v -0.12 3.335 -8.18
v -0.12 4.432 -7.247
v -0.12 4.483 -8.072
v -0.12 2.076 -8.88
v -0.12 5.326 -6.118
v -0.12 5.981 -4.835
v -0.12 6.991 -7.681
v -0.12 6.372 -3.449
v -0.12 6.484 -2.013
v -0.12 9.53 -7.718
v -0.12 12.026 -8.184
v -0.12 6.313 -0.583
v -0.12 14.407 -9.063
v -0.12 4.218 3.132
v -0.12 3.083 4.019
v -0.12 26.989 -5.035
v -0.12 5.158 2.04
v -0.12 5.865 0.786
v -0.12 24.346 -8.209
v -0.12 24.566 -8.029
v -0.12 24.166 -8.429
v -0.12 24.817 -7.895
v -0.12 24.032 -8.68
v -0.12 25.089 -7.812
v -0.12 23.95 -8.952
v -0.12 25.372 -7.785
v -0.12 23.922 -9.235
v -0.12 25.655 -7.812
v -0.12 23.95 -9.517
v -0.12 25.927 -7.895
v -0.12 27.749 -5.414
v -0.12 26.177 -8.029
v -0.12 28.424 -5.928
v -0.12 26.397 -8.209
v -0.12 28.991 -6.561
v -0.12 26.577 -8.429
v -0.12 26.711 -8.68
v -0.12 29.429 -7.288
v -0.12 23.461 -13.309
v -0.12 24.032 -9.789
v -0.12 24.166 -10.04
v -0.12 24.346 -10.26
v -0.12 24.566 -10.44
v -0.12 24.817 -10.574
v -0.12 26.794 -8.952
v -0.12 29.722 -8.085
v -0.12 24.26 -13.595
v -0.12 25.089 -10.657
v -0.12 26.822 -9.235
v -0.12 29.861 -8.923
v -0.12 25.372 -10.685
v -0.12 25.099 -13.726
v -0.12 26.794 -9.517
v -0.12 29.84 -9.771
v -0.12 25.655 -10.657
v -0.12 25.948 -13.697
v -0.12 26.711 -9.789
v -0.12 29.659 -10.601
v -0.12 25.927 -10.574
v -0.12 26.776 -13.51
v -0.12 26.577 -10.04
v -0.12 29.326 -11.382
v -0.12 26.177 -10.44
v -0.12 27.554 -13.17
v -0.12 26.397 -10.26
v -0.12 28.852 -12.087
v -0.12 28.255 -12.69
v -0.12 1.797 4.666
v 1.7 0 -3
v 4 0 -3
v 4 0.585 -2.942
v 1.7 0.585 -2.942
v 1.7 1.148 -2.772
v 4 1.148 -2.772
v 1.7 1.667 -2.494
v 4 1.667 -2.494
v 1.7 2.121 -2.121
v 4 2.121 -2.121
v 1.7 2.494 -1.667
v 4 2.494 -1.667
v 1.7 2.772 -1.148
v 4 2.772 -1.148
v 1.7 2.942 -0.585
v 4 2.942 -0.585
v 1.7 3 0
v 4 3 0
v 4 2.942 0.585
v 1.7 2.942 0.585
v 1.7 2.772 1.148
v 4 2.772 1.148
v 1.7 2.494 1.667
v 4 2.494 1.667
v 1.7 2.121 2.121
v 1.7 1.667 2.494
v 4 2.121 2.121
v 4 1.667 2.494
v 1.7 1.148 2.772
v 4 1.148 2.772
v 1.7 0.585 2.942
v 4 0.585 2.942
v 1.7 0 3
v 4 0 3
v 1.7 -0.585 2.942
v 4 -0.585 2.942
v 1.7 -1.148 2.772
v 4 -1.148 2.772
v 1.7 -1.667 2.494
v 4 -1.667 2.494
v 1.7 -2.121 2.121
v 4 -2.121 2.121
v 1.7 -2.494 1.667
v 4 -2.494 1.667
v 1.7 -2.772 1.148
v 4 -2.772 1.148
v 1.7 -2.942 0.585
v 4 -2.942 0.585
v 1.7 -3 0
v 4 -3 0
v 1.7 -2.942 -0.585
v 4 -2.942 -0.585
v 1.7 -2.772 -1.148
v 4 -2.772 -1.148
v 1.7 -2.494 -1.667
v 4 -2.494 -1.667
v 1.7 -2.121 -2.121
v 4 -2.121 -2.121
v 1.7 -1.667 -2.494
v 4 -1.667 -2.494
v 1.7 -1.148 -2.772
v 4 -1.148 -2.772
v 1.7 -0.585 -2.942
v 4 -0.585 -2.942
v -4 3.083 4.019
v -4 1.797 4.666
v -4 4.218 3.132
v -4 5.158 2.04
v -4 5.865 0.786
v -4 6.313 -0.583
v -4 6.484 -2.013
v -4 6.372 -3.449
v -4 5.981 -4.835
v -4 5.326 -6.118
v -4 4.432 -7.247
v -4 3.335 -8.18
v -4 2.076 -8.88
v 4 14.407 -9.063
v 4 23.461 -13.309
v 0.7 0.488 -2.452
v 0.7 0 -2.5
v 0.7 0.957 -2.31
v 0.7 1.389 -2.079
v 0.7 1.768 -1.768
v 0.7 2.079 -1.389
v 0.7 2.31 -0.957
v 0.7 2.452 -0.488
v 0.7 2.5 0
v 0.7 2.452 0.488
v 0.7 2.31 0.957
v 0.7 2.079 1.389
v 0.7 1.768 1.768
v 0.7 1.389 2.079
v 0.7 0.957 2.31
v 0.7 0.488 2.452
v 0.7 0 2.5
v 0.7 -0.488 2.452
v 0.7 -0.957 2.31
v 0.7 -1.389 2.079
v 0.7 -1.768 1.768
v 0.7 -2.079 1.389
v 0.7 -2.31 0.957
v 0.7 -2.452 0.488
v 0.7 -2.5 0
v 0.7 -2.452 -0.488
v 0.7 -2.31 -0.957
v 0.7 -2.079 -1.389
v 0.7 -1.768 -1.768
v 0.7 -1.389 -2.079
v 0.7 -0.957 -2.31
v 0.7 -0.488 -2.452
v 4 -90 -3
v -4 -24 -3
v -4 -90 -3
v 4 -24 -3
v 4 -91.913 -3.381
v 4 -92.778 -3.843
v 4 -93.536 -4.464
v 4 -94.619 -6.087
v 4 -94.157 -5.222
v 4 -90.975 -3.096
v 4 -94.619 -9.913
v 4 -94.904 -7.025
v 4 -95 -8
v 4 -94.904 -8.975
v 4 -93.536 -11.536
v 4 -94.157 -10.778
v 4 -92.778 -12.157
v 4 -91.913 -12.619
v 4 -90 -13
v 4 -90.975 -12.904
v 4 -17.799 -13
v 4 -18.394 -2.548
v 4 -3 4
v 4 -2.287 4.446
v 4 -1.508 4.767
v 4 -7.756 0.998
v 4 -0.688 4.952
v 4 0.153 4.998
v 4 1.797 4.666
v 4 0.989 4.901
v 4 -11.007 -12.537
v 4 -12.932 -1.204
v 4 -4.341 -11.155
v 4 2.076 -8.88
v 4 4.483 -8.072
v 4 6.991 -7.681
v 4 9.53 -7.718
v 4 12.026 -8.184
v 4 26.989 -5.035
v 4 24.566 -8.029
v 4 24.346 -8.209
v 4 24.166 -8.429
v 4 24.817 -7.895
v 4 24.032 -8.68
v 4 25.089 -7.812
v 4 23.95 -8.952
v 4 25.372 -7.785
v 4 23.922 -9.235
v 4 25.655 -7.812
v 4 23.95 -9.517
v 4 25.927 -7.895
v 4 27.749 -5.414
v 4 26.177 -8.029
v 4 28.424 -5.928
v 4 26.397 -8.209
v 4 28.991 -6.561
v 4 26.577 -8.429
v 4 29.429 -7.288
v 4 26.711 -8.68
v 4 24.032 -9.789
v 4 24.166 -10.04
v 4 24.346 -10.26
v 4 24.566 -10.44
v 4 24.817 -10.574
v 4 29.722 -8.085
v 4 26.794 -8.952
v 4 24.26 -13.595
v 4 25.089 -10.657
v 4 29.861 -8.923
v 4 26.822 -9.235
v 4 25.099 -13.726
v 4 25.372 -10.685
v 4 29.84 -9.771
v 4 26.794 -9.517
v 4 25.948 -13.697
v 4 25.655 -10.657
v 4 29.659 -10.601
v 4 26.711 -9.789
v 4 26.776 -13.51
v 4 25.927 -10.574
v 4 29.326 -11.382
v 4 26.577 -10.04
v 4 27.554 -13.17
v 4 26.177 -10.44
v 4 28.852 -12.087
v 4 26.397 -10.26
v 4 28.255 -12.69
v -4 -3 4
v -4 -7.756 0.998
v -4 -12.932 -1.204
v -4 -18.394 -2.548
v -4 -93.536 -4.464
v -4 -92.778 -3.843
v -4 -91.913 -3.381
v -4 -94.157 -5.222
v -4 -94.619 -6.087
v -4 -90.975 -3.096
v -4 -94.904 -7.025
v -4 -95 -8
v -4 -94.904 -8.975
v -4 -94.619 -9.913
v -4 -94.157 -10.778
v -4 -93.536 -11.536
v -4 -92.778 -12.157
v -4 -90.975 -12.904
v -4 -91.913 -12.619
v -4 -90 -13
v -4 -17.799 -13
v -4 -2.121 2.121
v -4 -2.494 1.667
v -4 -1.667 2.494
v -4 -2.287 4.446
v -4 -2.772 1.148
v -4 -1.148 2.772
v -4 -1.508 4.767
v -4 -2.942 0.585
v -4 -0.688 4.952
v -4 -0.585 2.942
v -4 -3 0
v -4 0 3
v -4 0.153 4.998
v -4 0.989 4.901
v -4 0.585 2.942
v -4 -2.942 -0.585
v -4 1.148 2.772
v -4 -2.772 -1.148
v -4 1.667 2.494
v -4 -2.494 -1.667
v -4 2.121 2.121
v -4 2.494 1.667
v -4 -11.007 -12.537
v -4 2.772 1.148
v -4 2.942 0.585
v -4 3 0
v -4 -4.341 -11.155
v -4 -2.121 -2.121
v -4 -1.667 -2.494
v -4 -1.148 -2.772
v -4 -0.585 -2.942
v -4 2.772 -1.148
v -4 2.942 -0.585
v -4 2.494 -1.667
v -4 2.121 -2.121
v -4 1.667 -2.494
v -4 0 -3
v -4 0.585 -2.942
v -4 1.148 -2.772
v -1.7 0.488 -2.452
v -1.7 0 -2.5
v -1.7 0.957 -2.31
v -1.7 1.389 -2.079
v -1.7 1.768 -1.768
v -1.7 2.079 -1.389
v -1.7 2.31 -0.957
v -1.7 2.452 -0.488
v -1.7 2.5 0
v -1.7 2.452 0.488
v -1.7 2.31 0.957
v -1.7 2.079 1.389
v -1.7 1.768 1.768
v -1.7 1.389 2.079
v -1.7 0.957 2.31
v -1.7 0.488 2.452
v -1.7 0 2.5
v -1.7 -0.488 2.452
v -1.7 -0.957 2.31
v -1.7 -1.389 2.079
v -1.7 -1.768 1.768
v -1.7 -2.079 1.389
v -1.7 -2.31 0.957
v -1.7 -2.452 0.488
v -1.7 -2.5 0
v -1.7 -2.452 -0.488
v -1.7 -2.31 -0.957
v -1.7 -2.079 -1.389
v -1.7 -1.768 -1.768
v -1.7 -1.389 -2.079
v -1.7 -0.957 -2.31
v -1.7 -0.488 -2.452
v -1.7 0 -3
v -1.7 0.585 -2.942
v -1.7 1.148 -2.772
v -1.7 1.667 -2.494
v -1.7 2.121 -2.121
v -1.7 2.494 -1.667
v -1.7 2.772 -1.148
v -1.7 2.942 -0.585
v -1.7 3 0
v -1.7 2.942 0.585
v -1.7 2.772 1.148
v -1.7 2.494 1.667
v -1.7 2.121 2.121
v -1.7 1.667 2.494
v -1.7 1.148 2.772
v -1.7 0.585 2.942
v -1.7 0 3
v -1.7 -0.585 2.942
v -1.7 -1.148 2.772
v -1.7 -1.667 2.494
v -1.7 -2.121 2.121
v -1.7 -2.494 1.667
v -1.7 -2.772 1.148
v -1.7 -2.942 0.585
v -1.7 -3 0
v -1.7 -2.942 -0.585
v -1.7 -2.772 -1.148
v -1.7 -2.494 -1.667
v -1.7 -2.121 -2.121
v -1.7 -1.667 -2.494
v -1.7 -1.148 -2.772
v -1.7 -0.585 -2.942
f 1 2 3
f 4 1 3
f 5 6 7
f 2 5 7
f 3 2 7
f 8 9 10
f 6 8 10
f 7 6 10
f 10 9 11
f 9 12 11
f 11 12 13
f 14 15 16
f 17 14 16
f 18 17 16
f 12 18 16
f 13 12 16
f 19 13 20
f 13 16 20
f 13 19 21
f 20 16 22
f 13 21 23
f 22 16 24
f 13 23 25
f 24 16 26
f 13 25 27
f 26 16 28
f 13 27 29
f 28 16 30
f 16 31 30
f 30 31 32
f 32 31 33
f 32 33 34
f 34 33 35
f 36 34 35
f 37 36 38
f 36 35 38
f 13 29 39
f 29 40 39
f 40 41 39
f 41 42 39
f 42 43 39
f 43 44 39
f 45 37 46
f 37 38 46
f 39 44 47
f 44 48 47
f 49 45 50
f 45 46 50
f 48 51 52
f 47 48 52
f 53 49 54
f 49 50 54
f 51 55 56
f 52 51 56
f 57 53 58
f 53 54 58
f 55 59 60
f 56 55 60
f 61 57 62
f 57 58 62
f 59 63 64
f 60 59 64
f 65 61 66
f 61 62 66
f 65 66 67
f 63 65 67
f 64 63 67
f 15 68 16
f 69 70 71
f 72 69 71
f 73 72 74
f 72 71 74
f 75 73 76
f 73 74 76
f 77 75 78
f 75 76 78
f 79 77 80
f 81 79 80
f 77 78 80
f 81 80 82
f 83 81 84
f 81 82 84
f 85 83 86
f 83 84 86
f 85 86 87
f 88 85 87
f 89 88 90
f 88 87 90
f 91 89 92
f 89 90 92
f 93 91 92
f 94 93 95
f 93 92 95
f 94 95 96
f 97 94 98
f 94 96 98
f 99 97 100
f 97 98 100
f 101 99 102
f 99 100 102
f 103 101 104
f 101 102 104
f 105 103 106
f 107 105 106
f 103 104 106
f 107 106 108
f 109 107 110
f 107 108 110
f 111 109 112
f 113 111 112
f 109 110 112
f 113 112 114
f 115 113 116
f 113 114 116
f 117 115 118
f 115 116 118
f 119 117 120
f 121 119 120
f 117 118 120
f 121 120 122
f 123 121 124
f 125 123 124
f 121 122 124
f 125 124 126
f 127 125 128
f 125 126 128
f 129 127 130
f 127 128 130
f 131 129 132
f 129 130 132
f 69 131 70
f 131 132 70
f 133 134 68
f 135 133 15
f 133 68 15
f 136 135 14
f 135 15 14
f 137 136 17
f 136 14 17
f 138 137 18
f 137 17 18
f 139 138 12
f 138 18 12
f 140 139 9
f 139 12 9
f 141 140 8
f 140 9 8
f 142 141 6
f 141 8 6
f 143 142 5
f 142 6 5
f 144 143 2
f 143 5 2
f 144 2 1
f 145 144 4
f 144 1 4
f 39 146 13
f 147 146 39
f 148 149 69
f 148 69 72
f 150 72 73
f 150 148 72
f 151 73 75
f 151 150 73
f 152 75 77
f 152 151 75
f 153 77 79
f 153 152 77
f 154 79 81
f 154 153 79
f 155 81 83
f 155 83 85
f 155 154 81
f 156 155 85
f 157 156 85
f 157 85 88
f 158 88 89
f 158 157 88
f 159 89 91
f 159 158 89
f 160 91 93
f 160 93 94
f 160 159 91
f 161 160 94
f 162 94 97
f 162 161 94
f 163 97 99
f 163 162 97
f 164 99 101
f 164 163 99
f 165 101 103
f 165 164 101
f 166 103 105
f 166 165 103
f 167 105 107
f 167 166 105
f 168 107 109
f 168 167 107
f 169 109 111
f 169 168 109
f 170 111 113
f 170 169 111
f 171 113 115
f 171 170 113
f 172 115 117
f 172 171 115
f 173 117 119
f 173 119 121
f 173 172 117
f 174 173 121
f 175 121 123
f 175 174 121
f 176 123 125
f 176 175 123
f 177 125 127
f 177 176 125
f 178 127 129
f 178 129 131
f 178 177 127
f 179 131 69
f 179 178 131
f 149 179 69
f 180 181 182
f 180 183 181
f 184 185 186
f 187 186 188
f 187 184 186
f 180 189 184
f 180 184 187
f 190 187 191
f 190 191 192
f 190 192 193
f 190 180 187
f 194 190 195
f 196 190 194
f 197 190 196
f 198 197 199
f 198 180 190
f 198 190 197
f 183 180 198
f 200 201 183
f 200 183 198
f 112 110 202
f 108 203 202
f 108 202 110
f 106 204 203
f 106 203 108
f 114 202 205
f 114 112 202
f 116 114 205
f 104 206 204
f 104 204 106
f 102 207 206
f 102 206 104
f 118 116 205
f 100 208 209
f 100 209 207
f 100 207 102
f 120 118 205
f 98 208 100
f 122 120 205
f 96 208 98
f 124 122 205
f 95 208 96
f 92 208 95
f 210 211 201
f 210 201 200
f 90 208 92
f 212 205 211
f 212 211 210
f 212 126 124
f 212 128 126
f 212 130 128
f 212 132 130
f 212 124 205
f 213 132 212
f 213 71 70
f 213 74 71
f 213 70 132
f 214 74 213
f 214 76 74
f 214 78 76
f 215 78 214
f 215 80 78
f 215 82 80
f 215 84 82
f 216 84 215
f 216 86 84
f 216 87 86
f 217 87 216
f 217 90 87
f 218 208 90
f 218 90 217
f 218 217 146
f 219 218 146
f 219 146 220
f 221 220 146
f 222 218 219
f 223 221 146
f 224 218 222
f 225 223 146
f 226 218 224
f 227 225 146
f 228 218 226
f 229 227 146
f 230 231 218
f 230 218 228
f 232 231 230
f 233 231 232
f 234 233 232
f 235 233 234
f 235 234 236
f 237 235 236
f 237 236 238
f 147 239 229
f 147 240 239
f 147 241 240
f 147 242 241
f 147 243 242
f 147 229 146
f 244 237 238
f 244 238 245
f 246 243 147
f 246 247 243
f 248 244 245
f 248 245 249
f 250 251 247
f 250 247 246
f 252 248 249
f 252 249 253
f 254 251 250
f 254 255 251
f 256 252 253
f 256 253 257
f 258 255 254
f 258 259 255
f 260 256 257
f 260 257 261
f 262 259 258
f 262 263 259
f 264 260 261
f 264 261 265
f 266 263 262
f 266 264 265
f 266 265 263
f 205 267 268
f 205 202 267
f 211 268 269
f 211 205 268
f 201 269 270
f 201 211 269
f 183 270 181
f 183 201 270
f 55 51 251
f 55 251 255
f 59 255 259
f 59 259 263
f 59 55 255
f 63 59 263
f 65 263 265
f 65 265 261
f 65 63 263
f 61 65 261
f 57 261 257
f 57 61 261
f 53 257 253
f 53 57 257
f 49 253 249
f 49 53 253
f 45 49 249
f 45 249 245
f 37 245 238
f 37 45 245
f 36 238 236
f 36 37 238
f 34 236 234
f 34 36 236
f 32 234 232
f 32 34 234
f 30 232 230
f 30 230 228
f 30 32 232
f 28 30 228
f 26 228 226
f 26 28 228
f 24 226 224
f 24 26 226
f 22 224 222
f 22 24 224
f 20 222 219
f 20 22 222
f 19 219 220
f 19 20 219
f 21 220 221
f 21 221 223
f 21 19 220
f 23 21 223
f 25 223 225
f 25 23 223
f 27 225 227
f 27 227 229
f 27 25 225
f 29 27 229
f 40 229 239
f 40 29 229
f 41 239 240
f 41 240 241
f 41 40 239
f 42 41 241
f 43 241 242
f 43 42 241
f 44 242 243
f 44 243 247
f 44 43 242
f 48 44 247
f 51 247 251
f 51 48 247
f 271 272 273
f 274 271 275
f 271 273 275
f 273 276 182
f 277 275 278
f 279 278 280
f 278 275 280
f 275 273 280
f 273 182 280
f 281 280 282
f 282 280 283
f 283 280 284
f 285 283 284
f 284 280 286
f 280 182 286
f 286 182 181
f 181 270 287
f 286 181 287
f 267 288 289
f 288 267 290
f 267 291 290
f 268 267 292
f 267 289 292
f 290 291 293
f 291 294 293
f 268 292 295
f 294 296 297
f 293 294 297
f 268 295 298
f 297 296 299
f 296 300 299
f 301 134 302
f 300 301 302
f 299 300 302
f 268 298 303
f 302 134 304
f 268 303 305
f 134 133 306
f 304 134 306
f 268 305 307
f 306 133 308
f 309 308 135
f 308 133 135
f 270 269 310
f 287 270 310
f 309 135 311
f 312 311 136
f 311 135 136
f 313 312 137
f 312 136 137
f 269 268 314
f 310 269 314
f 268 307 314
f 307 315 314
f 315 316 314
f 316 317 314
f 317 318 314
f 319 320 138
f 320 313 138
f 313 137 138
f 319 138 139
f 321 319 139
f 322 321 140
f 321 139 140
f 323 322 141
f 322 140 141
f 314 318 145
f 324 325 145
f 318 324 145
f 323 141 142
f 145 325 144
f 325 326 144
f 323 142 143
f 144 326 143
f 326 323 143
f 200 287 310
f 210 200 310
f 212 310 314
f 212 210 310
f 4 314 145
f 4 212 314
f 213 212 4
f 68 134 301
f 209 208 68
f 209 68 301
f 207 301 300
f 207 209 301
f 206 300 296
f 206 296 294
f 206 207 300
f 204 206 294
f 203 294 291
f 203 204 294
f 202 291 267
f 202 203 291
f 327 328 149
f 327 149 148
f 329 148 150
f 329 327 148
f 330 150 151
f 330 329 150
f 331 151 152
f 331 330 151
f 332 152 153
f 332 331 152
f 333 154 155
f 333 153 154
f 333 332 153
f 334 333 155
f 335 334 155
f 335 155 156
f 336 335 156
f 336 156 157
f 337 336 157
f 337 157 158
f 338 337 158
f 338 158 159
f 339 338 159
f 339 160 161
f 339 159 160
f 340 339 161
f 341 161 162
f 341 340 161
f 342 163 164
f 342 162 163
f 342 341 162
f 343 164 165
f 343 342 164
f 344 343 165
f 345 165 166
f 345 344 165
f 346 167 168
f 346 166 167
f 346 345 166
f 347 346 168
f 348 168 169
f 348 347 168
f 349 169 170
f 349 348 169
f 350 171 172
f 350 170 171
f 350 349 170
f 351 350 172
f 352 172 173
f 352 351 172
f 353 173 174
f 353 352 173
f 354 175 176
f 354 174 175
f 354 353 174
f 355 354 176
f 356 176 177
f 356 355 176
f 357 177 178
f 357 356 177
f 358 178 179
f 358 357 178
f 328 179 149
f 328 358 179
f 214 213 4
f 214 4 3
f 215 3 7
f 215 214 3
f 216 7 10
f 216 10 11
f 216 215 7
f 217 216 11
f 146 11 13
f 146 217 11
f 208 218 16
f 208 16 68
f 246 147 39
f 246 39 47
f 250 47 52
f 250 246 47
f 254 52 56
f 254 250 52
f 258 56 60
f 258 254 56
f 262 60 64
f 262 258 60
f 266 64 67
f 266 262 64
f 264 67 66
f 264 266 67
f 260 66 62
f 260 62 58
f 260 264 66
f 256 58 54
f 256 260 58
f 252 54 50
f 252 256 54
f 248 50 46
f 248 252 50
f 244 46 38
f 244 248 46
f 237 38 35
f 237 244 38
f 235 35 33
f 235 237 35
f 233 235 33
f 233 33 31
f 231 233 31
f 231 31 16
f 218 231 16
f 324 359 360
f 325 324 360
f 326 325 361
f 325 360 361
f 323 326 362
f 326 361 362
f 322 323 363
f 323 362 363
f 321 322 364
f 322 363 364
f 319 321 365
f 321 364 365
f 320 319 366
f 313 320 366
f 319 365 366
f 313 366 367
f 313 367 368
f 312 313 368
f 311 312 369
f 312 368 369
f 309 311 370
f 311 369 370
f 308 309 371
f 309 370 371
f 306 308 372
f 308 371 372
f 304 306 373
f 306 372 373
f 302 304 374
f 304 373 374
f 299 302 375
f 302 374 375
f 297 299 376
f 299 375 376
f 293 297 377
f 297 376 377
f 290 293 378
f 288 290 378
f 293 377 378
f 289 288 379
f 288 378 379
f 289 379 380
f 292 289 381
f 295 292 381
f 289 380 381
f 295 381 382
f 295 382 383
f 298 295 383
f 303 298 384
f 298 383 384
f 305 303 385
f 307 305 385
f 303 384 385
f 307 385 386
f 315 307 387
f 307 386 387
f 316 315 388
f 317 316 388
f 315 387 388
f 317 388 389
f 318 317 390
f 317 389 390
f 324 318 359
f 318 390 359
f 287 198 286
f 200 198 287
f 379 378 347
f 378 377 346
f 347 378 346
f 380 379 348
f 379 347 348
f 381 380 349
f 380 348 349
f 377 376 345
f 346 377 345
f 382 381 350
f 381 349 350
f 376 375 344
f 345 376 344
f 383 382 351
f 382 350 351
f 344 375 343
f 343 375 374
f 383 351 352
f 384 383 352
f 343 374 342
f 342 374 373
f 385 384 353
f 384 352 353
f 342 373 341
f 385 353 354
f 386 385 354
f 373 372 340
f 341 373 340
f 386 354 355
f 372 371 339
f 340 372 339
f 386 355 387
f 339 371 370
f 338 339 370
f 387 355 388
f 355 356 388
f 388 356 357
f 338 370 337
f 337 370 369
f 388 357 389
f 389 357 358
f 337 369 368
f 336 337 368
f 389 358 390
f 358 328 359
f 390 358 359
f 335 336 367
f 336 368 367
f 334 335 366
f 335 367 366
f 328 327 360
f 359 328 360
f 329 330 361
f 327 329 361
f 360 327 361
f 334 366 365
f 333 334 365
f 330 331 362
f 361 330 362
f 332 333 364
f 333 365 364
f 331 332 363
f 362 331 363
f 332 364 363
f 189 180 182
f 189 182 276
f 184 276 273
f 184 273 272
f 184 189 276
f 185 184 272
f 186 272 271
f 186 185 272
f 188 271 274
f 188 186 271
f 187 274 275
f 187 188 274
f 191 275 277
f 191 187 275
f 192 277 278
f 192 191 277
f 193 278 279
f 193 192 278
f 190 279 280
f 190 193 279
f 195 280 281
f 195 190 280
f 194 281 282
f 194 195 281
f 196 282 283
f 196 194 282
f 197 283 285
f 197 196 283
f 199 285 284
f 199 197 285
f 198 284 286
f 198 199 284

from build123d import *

# Parameters (mm, degrees)
SKETCH1_R           = 2.5
SKETCH1_R_2         = 1.45
BOSS_EXTRUDE1_DEPTH = 4
SKETCH2_R           = 3
CUT_EXTRUDE1_DEPTH  = 3.3
CUT_EXTRUDE2_START  = -0.12
SKETCH1_5_R         = 4.5
SKETCH1_5_R_2       = 1.45
CUT_EXTRUDE2_DEPTH  = 96.951003405
CUT_EXTRUDE3_START  = -5.7
SKETCH2_2_R         = 3
CUT_EXTRUDE3_DEPTH  = 2.3
CHAMFER1_SIZE2      = 0.5
CHAMFER1_SIZE       = 1


with BuildPart() as part:
    # Sketch1 → Boss-Extrude1 (new, symmetric)
    with BuildSketch(Plane(origin=(0, 0, 0), x_dir=(0, 0, -1), z_dir=(1, 0, 0))):
        with BuildLine():
            Line((3, -24), (3, -90))
            ThreePointArc((3, -90), (8, -95), (13, -90))
            Line((13, -90), (13, -17.799320055))
            ThreePointArc((13, -17.799320055), (11.959160872, -7.650400571), (8.879977332, 2.075983213))
            ThreePointArc((8.879977332, 2.075983213), (7.645623758, 8.261271435), (9.063072492, 14.407185379))
            Line((9.063072492, 14.407185379), (13.308813282, 23.461117406))
            ThreePointArc((13.308813282, 23.461117406), (10.999511856, 29.511131641), (5.035153889, 26.988835198))
            Line((5.035153889, 26.988835198), (-4.665988868, 1.79681604))
            ThreePointArc((-4.665988868, 1.79681604), (-4.952494502, -0.687603231), (-4, -3))
            ThreePointArc((-4, -3), (1.203915432, -12.932028189), (3, -24))
        make_face()
        Circle(SKETCH1_R, mode=Mode.SUBTRACT)
        with Locations((9.23454387, 25.371700761)):
            Circle(SKETCH1_R_2, mode=Mode.SUBTRACT)
    extrude(amount=BOSS_EXTRUDE1_DEPTH, both=True)

    # Sketch2 → Cut-Extrude1 (cut)
    with BuildSketch(Plane(origin=(4, 0, 0), x_dir=(0, 0, -1), z_dir=(1, 0, 0))):
        Circle(SKETCH2_R)
    extrude(amount=-CUT_EXTRUDE1_DEPTH, mode=Mode.SUBTRACT)

    # Sketch1<5> → Cut-Extrude2 (cut, through all)
    # profile 1 of 2: a face of its own
    with BuildSketch(Plane(origin=(0, 0, 0), x_dir=(0, 0, -1), z_dir=(1, 0, 0)).offset(CUT_EXTRUDE2_START)):
        with BuildLine():
            ThreePointArc((-4.665988868, 1.79681604), (2.013271717, 6.484076223), (8.879977332, 2.075983213))
            ThreePointArc((8.879977332, 2.075983213), (7.645623758, 8.261271435), (9.063072492, 14.407185379))
            Line((9.063072492, 14.407185379), (13.308813282, 23.461117406))
            ThreePointArc((13.308813282, 23.461117406), (7.469575883, 21.232269882), (5.035153889, 26.988835198))
            Line((5.035153889, 26.988835198), (-4.665988868, 1.79681604))
        make_face()
    # profile 2 of 2: a face of its own
    with BuildSketch(Plane(origin=(0, 0, 0), x_dir=(0, 0, -1), z_dir=(1, 0, 0)).offset(CUT_EXTRUDE2_START)):
        with Locations((9.23454387, 25.371700761)):
            Circle(SKETCH1_5_R)
        with Locations((9.23454387, 25.371700761)):
            Circle(SKETCH1_5_R_2, mode=Mode.SUBTRACT)
    extrude(amount=-CUT_EXTRUDE2_DEPTH, mode=Mode.SUBTRACT)

    # Sketch2<2> → Cut-Extrude3 (cut)
    with BuildSketch(Plane(origin=(4, 0, 0), x_dir=(0, 0, -1), z_dir=(1, 0, 0)).offset(CUT_EXTRUDE3_START)):
        Circle(SKETCH2_2_R)
    extrude(amount=-CUT_EXTRUDE3_DEPTH, mode=Mode.SUBTRACT)

    # Chamfer1
    chamfer1_edges = [part.edges().sort_by_distance(p)[0] for p in [
        (0.7, 0, 3),
    ]]
    chamfer1_side = [part.faces().sort_by_distance(p)[0] for p in [
        (0.71, 0, 3),
    ]]
    chamfer(chamfer1_edges, length=CHAMFER1_SIZE - 0.0001, length2=CHAMFER1_SIZE2 - 0.0001, reference=chamfer1_side[0])  # a hair under: the kernel refuses the full size


solid = part.part
